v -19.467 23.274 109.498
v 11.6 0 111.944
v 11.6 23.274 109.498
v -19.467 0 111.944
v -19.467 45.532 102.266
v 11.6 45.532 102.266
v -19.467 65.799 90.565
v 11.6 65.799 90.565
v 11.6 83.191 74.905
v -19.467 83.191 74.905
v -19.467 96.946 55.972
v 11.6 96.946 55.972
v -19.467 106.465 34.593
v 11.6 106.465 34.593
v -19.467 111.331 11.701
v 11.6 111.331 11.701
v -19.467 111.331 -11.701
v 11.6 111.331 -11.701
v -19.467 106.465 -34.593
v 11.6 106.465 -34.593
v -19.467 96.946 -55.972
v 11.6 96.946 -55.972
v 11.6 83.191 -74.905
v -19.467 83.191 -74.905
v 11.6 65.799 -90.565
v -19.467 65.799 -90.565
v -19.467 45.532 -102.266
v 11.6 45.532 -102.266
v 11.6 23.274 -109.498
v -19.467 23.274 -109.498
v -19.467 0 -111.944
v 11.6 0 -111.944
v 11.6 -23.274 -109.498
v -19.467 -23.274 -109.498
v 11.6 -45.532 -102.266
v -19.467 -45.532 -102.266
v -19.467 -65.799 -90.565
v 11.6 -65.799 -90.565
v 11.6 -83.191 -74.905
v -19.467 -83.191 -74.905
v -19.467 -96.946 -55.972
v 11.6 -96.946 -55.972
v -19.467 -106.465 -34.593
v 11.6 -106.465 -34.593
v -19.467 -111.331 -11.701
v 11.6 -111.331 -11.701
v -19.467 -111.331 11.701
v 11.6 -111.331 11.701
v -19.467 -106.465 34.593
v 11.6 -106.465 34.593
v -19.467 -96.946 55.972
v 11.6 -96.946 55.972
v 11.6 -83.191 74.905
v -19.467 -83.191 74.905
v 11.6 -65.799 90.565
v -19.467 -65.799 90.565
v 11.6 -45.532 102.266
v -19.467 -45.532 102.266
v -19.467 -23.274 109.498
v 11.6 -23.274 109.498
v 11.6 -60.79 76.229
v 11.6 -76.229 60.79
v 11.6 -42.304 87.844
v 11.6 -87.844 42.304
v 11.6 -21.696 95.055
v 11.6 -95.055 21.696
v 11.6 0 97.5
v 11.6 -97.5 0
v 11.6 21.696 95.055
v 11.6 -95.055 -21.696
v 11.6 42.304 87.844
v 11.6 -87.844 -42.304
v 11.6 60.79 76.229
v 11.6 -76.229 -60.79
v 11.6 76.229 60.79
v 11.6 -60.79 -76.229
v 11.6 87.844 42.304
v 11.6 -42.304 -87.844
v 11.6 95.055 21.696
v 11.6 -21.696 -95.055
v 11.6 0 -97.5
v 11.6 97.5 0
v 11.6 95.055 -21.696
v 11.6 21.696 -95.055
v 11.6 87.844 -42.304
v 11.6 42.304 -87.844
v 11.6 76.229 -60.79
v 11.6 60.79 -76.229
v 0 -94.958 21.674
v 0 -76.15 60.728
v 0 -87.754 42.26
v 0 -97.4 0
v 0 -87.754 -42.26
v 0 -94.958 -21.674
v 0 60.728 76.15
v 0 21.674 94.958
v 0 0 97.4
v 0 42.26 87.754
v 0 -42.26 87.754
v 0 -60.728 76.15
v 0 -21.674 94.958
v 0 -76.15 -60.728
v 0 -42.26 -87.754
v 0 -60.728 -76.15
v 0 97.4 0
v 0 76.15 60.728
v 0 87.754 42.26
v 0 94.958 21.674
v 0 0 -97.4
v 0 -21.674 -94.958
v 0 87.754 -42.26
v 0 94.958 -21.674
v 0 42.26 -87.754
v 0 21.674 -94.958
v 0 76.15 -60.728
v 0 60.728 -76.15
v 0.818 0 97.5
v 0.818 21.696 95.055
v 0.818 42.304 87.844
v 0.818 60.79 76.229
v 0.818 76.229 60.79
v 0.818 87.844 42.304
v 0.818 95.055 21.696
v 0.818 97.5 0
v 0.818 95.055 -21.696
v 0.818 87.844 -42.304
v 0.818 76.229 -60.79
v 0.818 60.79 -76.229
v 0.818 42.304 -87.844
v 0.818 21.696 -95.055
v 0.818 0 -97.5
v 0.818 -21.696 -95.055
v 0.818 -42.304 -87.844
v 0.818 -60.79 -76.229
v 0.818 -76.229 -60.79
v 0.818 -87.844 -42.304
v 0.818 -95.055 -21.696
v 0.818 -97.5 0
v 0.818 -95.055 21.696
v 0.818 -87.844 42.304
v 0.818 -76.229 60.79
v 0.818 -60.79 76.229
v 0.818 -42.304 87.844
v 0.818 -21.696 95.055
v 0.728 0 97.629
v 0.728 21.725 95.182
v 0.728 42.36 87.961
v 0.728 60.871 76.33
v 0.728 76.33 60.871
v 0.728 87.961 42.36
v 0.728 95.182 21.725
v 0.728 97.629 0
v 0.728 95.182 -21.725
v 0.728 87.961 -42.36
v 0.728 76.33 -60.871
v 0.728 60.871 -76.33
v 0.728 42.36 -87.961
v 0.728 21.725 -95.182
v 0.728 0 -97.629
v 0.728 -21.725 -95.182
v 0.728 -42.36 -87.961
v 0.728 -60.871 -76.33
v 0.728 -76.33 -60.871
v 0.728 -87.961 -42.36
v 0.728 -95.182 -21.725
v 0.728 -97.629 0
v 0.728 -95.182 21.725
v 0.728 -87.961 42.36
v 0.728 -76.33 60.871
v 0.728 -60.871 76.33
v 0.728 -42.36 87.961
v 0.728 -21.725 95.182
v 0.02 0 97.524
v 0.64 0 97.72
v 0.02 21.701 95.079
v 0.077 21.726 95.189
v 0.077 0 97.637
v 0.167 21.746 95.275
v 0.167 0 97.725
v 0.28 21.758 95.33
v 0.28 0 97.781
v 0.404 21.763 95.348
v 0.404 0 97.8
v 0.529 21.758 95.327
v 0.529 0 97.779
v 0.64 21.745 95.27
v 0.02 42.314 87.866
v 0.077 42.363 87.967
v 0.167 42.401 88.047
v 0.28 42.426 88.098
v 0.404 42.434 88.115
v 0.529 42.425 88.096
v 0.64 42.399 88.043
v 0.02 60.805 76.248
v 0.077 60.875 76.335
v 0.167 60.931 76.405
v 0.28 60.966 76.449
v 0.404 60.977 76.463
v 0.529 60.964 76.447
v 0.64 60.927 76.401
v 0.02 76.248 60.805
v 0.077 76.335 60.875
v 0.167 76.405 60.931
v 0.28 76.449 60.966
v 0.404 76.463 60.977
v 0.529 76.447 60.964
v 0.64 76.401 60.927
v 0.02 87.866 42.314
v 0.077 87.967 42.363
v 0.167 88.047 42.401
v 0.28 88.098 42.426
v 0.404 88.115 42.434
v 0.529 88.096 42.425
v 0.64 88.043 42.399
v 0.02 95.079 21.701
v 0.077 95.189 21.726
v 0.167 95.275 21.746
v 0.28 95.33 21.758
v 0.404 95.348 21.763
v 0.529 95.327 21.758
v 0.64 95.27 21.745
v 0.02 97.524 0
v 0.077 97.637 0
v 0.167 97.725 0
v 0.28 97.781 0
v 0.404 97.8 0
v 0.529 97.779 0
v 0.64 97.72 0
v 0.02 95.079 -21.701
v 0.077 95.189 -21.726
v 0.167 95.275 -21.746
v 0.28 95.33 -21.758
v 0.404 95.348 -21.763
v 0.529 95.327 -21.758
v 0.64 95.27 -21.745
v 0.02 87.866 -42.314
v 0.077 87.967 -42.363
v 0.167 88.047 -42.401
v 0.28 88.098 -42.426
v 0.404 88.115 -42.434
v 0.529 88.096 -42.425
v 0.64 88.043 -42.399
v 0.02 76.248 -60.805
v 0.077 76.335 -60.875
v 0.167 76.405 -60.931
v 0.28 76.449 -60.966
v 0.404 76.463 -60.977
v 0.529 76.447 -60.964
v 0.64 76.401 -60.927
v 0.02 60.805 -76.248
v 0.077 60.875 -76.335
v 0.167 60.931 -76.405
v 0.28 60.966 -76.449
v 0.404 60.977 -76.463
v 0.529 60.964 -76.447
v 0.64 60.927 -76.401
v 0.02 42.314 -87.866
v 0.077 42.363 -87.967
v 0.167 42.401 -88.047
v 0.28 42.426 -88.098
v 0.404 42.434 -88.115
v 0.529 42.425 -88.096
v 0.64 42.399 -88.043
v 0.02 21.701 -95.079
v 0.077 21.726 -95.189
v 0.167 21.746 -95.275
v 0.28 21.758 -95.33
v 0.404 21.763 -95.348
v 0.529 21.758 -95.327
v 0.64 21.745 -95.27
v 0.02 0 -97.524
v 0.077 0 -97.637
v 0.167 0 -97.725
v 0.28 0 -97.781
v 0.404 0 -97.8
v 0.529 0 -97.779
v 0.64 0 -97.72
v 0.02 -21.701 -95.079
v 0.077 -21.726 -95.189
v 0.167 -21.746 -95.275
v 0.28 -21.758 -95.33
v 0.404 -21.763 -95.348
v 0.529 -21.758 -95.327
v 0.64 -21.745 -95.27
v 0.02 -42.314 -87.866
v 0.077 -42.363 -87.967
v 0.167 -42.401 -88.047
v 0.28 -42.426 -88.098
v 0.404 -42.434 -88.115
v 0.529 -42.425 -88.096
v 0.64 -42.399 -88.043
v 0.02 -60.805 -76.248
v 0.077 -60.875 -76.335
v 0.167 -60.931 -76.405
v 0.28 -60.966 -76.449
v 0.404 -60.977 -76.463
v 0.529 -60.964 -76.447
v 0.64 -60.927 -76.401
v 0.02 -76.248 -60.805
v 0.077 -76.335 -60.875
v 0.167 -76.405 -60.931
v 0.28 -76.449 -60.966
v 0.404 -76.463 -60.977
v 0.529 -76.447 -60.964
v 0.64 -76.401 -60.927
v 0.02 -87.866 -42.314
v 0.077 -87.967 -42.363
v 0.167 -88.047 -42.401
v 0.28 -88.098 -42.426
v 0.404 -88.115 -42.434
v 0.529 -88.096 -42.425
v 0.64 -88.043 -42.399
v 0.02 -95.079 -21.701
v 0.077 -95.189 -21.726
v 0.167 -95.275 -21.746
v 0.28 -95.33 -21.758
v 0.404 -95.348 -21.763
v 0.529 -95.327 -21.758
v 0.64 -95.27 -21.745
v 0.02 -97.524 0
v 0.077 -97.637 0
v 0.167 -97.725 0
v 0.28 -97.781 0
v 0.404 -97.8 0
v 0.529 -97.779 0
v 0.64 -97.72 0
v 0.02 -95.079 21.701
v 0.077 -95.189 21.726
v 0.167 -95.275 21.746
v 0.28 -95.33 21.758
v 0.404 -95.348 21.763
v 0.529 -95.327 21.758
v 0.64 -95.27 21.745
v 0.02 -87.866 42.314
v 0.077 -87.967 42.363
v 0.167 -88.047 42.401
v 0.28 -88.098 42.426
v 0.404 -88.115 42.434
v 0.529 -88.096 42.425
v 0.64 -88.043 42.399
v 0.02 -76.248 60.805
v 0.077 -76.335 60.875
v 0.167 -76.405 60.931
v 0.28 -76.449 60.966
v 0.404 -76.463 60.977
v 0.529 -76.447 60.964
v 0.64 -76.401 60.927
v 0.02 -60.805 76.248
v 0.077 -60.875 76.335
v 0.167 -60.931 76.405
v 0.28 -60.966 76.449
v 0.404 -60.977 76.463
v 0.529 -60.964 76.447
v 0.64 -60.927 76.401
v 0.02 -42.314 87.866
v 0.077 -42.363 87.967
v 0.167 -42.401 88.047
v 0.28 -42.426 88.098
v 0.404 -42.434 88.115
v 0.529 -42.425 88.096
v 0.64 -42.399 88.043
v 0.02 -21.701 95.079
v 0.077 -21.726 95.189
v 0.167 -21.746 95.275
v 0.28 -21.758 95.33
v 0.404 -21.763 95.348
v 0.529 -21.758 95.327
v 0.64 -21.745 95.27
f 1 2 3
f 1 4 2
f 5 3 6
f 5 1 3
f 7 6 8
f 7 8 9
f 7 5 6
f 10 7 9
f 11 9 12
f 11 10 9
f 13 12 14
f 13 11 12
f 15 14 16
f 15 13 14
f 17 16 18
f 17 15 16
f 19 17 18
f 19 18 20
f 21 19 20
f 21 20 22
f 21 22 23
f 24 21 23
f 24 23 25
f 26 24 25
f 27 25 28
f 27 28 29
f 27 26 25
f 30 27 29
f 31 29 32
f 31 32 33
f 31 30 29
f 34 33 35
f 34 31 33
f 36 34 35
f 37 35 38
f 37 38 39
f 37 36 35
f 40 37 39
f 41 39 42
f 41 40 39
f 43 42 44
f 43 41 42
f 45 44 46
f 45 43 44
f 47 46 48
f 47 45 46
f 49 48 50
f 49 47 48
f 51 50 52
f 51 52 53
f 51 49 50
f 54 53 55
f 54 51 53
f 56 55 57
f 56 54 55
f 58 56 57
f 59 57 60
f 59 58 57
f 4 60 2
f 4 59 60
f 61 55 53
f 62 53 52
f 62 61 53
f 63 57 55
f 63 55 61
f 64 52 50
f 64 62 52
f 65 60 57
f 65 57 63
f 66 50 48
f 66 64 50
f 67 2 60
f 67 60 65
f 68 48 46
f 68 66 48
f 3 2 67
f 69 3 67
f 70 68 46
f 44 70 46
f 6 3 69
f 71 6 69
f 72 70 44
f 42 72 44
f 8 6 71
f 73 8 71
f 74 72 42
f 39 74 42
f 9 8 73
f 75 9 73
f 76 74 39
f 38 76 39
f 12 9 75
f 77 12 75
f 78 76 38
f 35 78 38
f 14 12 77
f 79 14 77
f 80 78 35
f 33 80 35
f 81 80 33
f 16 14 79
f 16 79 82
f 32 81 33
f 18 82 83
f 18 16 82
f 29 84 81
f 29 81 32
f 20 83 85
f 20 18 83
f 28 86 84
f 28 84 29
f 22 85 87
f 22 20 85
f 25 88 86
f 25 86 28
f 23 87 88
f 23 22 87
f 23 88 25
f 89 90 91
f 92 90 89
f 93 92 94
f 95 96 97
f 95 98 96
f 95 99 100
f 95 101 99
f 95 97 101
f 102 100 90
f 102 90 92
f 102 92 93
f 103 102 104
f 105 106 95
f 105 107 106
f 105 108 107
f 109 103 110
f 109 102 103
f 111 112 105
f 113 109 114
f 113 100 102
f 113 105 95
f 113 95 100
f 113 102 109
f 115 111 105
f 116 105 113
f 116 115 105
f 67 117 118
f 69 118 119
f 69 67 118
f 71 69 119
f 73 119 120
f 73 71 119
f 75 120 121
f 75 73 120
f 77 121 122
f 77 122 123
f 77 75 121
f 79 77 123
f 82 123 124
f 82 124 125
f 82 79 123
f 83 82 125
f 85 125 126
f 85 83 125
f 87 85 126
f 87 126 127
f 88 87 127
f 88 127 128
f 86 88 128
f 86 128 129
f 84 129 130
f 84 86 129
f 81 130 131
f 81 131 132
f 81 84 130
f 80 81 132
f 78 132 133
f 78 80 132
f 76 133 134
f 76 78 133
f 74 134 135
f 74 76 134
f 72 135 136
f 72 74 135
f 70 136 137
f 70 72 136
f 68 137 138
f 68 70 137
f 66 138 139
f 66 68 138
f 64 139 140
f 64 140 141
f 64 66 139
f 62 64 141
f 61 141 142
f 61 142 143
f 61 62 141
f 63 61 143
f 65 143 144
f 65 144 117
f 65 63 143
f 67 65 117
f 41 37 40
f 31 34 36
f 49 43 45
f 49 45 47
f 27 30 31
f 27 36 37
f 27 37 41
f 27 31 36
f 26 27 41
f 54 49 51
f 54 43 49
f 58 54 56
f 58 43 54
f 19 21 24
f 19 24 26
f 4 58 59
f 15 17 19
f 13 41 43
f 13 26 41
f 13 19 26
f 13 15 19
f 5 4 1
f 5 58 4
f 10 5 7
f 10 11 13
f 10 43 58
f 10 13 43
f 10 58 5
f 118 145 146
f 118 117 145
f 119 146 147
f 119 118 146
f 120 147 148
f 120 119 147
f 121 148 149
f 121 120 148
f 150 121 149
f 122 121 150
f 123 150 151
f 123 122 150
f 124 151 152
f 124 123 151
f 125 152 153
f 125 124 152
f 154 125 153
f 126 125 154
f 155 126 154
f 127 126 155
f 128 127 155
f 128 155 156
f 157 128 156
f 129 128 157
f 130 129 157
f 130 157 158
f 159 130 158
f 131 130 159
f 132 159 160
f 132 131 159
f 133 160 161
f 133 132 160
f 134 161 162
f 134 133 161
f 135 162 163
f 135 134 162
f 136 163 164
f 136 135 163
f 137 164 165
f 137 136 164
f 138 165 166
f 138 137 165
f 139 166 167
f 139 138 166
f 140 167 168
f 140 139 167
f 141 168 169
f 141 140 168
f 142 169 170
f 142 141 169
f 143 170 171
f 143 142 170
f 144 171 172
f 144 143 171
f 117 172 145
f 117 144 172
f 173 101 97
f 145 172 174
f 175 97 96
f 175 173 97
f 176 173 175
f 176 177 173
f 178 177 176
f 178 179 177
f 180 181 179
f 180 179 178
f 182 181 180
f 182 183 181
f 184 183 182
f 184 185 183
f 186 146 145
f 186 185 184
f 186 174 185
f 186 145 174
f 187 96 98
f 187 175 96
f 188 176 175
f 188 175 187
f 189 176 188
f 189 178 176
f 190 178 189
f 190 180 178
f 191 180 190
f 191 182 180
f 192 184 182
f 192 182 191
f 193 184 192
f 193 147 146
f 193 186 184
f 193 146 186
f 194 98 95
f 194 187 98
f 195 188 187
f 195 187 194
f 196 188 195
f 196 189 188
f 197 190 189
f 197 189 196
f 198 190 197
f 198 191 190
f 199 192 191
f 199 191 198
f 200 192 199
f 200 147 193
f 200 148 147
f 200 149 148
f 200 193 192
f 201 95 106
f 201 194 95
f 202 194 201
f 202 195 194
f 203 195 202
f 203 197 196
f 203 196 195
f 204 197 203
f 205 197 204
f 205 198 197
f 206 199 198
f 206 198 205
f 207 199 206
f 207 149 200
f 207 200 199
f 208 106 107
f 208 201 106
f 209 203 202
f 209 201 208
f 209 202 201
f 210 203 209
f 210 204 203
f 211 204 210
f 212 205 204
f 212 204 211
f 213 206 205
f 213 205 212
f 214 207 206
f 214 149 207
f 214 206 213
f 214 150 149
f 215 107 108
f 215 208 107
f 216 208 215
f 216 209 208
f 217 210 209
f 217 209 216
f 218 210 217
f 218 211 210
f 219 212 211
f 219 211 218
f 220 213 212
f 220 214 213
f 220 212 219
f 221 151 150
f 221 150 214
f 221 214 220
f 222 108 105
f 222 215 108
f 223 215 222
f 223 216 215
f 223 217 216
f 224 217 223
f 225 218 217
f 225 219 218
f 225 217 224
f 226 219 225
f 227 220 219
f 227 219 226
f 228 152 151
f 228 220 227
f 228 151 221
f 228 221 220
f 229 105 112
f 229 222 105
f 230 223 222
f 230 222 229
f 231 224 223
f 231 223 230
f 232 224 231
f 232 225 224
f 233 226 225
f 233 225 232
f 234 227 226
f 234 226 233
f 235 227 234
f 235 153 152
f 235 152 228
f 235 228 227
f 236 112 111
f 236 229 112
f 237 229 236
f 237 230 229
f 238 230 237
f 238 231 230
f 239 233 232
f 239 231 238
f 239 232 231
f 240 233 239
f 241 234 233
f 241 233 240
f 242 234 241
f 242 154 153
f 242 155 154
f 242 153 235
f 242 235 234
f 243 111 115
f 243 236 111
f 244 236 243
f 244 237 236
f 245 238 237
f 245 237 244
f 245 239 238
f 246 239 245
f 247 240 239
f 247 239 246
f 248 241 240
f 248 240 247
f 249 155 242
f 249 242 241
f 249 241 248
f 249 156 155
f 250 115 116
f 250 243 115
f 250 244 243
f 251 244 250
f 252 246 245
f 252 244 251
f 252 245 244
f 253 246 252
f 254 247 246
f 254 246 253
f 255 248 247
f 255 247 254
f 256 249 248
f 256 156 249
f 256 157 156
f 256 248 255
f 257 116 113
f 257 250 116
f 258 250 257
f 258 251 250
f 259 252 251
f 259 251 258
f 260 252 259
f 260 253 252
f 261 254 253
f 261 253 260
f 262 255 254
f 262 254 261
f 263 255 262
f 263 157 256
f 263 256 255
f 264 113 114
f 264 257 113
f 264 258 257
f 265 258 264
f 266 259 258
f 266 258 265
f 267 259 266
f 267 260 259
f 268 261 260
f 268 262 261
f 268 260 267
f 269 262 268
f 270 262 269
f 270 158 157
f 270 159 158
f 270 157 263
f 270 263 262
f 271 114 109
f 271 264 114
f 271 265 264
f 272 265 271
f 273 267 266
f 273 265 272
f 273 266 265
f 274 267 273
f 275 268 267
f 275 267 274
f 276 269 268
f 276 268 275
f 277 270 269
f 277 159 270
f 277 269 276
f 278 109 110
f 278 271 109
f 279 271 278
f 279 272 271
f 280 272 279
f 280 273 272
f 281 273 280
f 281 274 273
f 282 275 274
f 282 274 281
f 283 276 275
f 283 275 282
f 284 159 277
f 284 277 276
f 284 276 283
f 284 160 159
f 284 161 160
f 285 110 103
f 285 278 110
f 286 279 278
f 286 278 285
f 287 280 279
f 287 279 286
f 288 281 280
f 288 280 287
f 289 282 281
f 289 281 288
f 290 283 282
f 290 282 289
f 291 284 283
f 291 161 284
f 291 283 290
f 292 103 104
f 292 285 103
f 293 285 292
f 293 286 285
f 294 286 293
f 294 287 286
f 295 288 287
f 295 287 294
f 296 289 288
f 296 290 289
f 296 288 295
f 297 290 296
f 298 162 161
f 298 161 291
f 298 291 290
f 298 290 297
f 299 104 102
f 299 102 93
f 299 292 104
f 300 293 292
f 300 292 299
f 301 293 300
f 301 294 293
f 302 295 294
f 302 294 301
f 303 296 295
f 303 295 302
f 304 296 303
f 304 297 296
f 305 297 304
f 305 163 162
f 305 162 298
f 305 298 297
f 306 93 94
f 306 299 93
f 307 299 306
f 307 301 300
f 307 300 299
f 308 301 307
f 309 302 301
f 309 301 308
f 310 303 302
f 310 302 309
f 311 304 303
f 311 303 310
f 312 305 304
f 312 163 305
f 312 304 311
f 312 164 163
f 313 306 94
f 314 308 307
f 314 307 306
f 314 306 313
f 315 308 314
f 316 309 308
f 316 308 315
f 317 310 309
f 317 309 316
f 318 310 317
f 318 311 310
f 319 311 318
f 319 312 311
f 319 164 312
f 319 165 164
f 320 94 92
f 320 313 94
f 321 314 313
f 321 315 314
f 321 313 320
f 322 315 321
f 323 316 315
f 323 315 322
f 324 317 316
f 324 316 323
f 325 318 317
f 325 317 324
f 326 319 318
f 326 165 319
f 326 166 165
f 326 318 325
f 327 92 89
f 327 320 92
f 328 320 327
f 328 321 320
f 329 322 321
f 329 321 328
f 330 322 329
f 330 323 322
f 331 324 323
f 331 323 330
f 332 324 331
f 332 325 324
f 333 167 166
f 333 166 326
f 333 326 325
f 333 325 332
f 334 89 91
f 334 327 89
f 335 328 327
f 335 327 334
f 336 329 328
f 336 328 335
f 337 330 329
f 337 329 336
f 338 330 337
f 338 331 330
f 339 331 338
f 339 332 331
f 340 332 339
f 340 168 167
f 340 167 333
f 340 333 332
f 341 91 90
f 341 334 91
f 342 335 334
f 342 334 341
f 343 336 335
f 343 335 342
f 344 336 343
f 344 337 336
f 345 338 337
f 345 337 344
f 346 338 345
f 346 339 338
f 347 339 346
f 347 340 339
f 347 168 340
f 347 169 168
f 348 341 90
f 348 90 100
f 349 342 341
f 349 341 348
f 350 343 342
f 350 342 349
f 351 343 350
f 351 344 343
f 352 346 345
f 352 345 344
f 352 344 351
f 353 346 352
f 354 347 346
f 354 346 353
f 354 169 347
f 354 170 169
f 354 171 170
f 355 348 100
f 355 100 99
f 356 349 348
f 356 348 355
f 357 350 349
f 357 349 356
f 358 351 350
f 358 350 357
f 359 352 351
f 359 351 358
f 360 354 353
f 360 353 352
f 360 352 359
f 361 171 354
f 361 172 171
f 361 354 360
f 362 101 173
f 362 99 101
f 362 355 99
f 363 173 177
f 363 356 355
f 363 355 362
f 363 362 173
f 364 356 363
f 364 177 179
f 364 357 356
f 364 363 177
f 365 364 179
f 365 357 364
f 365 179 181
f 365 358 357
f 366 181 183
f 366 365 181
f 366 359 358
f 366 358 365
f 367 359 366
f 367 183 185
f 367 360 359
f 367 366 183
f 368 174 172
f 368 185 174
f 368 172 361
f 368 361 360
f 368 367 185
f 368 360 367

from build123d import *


with BuildPart() as f1:
    # F0 (on Front) → F1 (revolve)
    with BuildSketch(Plane.XZ):
        with BuildLine():
            Line((-19.466886, 0), (0, 0))
            Line((0, 0), (0, 97.4))
            ThreePointArc((0, 97.4), (0.279718, 97.781487), (0.727661, 97.629431))
            Line((0.727661, 97.629431), (0.818289, 97.5))
            Line((0.818289, 97.5), (11.6, 97.5))
            Line((11.6, 97.5), (11.6, 111.944042))
            Line((11.6, 111.944042), (-19.466886, 111.944042))
            Line((-19.466886, 111.944042), (-19.466886, 0))
        make_face()
    revolve(axis=Axis((-9.733443, 0, 0), (-1, 0, 0)))


solid = f1.part
